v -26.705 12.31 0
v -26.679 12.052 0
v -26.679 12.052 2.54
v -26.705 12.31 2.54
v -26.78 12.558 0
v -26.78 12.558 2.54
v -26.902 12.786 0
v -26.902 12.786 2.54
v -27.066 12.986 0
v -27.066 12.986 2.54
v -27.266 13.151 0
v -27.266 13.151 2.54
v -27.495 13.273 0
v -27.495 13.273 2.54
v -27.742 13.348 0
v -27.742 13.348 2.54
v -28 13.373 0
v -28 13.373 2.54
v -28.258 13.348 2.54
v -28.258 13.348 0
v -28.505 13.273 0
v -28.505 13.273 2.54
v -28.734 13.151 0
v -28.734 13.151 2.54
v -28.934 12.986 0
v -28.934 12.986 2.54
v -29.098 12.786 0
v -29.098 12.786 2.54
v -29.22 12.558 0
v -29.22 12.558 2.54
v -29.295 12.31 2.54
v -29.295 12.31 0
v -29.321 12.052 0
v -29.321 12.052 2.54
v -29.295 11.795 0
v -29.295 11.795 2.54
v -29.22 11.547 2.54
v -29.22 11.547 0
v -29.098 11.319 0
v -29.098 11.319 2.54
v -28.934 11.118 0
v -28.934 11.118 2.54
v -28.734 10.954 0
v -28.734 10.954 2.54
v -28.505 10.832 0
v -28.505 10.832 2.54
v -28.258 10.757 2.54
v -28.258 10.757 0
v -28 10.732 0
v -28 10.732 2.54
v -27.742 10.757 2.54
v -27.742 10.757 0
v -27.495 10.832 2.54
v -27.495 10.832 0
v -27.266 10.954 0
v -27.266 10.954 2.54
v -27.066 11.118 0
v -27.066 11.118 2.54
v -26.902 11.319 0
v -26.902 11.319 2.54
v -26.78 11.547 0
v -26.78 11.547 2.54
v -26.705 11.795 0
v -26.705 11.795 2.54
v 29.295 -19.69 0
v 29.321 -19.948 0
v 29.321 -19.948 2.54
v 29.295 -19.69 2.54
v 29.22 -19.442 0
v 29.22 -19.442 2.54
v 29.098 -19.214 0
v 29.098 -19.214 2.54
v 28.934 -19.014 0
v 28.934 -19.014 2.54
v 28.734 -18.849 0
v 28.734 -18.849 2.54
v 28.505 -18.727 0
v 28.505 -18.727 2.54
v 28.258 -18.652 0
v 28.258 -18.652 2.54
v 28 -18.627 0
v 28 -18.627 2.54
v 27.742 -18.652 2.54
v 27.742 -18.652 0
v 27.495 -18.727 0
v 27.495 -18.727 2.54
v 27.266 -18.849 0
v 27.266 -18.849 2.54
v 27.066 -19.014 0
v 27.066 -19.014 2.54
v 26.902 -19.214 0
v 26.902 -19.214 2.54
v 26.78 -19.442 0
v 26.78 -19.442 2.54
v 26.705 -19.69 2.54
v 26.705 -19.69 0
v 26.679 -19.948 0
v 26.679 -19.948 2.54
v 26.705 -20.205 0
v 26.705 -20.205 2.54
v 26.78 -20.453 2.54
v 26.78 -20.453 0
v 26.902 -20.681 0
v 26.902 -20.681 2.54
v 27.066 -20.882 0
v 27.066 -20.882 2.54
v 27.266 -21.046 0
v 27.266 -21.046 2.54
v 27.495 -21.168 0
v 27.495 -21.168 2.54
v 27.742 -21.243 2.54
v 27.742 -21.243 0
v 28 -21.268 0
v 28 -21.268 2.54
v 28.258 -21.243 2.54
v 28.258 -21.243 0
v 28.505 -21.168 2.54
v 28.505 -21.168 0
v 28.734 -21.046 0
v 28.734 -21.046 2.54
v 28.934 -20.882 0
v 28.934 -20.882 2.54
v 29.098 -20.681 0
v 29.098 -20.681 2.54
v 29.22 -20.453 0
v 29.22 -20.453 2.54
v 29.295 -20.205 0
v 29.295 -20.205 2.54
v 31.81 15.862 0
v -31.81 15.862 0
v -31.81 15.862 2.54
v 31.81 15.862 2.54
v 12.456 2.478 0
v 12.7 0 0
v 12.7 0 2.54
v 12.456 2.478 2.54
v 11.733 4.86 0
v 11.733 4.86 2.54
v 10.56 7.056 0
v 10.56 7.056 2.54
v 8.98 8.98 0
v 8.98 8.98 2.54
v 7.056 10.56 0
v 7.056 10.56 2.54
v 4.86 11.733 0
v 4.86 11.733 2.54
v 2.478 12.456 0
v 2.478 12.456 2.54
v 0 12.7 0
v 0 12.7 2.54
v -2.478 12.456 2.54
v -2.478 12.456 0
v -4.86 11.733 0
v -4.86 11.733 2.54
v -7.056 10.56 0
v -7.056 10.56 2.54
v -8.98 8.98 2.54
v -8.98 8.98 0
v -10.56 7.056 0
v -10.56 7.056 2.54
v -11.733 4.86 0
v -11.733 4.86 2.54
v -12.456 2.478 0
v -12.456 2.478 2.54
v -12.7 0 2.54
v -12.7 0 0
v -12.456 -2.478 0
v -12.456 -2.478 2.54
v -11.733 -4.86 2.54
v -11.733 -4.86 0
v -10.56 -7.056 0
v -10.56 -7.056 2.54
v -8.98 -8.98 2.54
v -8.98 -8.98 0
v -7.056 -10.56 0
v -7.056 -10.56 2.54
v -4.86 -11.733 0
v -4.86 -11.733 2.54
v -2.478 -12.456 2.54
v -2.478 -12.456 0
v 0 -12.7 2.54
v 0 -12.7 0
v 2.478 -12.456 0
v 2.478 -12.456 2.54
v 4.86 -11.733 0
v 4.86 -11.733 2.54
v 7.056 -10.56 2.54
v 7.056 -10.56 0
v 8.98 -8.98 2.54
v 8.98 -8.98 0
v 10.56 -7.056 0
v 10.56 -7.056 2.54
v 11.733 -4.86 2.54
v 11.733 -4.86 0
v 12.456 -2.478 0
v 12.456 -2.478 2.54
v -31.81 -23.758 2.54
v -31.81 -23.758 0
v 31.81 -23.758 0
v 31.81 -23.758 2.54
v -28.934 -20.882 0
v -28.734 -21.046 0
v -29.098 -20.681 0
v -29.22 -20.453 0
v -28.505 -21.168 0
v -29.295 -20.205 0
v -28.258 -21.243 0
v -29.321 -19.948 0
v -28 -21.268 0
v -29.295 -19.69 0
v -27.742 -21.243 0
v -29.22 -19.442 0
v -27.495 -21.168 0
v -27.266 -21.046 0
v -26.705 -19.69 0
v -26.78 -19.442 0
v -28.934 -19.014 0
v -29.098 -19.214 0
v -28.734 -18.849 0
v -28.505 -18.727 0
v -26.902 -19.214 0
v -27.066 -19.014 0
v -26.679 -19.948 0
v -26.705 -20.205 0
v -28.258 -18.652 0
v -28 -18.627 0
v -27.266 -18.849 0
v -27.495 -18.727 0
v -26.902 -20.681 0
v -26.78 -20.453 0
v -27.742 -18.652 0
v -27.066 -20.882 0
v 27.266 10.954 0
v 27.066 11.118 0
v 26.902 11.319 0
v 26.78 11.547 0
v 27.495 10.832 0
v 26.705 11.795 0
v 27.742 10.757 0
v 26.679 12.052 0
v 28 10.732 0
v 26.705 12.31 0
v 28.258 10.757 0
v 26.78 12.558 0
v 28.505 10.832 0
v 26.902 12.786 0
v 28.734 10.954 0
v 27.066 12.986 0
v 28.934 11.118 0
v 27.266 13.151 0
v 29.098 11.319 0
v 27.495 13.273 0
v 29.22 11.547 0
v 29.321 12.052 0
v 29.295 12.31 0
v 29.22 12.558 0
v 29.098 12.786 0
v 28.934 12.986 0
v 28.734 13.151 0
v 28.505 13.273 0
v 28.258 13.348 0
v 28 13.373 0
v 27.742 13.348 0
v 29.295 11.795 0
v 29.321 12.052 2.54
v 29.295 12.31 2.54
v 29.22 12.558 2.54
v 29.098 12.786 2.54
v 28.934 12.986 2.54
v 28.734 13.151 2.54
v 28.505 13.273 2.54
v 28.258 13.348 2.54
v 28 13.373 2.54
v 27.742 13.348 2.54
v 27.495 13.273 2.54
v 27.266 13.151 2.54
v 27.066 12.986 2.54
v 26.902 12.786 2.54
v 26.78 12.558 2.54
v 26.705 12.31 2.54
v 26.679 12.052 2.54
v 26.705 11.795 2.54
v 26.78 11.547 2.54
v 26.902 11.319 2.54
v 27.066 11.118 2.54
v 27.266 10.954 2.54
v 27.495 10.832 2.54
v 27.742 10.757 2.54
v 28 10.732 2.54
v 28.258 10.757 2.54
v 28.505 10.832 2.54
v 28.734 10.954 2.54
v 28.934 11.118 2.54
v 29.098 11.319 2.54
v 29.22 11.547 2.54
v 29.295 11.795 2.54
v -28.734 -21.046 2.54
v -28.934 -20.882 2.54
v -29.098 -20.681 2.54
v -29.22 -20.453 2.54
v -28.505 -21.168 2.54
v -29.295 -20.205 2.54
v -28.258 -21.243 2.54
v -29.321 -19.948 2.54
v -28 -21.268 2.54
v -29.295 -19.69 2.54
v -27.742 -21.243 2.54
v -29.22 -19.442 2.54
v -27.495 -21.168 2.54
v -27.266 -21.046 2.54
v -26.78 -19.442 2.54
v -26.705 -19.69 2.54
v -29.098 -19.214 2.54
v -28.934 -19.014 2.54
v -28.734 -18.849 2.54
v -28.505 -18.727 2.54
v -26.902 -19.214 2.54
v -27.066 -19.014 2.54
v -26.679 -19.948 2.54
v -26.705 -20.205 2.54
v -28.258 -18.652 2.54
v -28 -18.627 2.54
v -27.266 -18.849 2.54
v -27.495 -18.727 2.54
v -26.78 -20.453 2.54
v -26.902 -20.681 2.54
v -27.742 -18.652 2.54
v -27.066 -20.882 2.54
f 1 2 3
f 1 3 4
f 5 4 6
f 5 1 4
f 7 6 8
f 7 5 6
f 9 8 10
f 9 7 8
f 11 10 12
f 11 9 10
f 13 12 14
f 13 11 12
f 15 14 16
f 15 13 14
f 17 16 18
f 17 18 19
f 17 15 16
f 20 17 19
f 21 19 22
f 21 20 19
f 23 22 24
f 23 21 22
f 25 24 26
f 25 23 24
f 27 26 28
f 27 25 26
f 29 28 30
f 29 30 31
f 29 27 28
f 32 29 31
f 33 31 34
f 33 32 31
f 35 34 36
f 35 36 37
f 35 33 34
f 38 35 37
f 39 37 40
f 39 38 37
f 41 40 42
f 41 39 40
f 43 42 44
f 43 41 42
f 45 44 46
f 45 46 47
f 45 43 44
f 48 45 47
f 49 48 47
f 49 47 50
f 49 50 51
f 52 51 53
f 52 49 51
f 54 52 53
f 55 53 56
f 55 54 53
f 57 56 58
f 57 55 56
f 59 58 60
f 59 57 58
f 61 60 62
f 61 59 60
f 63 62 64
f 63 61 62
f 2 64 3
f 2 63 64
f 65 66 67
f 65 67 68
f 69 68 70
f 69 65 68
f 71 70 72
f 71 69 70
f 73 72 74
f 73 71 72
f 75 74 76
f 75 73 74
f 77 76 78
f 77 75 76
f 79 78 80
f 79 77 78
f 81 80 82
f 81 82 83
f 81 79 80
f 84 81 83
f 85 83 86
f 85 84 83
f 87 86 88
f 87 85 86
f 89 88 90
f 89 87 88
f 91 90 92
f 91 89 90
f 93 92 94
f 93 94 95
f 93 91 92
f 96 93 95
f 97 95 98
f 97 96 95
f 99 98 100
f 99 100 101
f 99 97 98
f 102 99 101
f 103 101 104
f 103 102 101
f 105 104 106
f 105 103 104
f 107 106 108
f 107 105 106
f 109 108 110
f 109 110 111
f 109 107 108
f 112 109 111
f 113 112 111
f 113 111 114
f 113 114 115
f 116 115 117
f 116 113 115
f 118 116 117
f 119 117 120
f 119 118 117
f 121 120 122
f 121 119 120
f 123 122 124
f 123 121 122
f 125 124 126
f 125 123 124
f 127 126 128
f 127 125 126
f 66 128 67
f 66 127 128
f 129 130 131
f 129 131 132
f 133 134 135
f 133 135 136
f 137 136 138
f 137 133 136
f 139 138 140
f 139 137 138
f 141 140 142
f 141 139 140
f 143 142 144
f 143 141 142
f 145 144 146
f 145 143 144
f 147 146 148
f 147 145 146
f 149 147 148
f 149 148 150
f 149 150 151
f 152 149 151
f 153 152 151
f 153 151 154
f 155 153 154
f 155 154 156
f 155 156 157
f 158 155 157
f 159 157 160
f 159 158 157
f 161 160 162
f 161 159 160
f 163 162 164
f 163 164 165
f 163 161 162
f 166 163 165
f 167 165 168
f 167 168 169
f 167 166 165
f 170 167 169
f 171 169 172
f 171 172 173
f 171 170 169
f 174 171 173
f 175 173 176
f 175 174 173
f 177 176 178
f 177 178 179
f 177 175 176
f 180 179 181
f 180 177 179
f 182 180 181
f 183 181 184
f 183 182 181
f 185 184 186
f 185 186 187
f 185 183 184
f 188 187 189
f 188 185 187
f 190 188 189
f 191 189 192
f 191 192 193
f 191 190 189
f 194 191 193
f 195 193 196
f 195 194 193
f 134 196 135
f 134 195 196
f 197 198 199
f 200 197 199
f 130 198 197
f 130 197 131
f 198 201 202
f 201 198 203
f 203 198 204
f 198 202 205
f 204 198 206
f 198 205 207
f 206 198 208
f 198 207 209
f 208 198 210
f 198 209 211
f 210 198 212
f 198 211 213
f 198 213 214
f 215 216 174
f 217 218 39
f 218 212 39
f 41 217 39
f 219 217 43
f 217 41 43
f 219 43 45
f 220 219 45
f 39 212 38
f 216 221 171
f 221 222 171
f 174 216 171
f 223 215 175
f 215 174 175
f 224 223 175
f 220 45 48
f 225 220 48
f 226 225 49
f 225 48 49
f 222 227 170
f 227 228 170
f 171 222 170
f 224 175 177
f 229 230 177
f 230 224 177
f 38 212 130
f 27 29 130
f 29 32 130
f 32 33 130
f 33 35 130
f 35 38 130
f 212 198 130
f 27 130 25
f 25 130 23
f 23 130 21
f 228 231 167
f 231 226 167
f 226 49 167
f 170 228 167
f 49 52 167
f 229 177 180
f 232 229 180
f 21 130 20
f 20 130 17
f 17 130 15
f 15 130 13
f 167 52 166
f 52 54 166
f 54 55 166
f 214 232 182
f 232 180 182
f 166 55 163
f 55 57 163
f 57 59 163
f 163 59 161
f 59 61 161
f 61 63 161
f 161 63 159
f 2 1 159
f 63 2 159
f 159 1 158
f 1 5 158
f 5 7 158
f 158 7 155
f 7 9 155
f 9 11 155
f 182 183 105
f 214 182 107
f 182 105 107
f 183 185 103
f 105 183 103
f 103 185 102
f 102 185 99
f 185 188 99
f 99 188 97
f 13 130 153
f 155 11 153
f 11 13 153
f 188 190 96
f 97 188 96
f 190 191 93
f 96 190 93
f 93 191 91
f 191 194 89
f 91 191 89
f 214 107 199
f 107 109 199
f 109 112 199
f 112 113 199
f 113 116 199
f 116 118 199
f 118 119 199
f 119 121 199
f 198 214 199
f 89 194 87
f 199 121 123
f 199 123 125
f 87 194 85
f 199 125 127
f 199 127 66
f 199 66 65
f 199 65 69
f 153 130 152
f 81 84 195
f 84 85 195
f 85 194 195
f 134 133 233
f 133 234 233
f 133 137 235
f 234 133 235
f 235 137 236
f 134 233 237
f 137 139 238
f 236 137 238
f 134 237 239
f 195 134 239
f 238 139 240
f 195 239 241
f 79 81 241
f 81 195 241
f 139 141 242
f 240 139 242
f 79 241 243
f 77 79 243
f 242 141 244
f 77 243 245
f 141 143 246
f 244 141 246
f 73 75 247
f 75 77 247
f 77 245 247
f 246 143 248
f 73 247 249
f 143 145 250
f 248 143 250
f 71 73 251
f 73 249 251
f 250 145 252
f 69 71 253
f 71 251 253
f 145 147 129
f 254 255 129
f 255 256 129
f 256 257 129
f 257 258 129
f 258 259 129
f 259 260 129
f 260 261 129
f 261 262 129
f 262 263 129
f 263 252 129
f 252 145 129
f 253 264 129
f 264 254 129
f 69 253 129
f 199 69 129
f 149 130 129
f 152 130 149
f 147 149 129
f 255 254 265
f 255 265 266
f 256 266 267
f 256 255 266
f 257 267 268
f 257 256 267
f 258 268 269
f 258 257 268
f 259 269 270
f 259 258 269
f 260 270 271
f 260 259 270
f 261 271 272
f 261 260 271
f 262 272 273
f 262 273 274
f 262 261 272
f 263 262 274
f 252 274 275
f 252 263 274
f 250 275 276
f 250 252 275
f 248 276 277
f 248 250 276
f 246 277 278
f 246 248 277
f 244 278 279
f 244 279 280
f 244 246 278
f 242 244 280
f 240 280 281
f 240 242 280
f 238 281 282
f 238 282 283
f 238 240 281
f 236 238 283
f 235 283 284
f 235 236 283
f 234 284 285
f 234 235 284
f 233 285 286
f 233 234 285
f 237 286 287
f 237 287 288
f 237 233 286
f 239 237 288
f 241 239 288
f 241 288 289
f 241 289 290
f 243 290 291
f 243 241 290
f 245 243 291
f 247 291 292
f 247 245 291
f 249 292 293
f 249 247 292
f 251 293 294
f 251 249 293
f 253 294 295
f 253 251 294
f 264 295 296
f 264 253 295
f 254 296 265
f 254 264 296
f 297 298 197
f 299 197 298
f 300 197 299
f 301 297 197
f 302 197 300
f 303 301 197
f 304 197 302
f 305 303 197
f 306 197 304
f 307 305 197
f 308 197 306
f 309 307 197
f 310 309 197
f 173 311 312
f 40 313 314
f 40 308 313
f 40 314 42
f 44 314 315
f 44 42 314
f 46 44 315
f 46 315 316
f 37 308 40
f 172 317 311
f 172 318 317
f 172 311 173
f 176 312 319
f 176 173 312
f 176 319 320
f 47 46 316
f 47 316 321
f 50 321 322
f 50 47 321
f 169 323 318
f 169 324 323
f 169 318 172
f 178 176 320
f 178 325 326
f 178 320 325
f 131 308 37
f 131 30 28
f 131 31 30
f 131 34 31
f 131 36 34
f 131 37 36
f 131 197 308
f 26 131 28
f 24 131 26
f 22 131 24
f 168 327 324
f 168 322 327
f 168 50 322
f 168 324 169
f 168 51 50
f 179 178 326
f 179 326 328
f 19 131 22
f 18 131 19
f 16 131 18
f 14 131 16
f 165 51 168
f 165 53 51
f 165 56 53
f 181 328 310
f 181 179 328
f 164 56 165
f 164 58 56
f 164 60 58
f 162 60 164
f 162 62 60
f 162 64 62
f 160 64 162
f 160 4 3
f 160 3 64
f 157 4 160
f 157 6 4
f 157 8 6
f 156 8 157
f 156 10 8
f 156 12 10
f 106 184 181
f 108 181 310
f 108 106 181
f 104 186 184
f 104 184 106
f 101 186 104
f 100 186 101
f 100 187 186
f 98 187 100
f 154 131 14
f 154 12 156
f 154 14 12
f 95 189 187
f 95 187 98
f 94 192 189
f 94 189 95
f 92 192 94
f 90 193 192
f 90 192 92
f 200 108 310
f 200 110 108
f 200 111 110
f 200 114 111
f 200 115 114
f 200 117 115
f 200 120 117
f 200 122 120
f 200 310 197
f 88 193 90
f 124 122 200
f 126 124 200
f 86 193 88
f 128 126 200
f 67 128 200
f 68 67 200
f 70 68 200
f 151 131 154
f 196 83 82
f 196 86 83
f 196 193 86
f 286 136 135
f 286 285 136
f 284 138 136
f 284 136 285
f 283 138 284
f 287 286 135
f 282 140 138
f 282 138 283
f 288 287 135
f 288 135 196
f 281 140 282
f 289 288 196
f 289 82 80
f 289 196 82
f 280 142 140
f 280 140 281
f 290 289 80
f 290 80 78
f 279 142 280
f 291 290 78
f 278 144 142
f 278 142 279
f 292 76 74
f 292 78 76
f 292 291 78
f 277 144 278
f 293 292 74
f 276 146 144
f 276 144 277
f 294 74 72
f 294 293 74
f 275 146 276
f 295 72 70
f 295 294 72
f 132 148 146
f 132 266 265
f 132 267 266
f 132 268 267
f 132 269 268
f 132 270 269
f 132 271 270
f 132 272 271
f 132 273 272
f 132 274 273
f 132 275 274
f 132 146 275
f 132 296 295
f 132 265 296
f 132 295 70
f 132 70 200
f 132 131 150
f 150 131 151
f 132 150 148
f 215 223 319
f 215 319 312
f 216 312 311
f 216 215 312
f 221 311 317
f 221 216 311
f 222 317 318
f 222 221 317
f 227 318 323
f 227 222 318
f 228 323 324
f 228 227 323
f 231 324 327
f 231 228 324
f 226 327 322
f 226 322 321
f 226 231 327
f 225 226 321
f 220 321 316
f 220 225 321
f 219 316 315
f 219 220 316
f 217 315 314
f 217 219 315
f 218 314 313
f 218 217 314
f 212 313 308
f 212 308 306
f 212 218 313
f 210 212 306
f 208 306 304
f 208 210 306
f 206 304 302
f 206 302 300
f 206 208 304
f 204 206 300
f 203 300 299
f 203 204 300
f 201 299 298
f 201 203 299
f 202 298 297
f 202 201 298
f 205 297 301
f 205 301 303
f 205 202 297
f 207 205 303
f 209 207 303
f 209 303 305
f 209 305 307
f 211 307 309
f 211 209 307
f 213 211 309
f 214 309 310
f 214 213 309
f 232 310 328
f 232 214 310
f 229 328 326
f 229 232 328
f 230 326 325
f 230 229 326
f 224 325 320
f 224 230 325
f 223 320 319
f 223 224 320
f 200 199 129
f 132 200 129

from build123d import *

# Parameters (mm, degrees)
SKETCH2_W           = 63.62
SKETCH2_H           = 39.62
SKETCH2_R           = 1.3208
SKETCH2_R_2         = 12.7
BOSS_EXTRUDE1_DEPTH = 2.54


with BuildPart() as part:
    # Sketch2 → Boss-Extrude1 (new body)
    with BuildSketch(Plane.XY):
        with Locations((0, -3.9477)):
            Rectangle(SKETCH2_W, SKETCH2_H)
        with Locations((-28, -19.9477)):
            Circle(SKETCH2_R, mode=Mode.SUBTRACT)
        with Locations((28, -19.9477)):
            Circle(SKETCH2_R, mode=Mode.SUBTRACT)
        with Locations((28, 12.0523)):
            Circle(SKETCH2_R, mode=Mode.SUBTRACT)
        with Locations((-28, 12.0523)):
            Circle(SKETCH2_R, mode=Mode.SUBTRACT)
        Circle(SKETCH2_R_2, mode=Mode.SUBTRACT)
    extrude(amount=BOSS_EXTRUDE1_DEPTH)


solid = part.part
